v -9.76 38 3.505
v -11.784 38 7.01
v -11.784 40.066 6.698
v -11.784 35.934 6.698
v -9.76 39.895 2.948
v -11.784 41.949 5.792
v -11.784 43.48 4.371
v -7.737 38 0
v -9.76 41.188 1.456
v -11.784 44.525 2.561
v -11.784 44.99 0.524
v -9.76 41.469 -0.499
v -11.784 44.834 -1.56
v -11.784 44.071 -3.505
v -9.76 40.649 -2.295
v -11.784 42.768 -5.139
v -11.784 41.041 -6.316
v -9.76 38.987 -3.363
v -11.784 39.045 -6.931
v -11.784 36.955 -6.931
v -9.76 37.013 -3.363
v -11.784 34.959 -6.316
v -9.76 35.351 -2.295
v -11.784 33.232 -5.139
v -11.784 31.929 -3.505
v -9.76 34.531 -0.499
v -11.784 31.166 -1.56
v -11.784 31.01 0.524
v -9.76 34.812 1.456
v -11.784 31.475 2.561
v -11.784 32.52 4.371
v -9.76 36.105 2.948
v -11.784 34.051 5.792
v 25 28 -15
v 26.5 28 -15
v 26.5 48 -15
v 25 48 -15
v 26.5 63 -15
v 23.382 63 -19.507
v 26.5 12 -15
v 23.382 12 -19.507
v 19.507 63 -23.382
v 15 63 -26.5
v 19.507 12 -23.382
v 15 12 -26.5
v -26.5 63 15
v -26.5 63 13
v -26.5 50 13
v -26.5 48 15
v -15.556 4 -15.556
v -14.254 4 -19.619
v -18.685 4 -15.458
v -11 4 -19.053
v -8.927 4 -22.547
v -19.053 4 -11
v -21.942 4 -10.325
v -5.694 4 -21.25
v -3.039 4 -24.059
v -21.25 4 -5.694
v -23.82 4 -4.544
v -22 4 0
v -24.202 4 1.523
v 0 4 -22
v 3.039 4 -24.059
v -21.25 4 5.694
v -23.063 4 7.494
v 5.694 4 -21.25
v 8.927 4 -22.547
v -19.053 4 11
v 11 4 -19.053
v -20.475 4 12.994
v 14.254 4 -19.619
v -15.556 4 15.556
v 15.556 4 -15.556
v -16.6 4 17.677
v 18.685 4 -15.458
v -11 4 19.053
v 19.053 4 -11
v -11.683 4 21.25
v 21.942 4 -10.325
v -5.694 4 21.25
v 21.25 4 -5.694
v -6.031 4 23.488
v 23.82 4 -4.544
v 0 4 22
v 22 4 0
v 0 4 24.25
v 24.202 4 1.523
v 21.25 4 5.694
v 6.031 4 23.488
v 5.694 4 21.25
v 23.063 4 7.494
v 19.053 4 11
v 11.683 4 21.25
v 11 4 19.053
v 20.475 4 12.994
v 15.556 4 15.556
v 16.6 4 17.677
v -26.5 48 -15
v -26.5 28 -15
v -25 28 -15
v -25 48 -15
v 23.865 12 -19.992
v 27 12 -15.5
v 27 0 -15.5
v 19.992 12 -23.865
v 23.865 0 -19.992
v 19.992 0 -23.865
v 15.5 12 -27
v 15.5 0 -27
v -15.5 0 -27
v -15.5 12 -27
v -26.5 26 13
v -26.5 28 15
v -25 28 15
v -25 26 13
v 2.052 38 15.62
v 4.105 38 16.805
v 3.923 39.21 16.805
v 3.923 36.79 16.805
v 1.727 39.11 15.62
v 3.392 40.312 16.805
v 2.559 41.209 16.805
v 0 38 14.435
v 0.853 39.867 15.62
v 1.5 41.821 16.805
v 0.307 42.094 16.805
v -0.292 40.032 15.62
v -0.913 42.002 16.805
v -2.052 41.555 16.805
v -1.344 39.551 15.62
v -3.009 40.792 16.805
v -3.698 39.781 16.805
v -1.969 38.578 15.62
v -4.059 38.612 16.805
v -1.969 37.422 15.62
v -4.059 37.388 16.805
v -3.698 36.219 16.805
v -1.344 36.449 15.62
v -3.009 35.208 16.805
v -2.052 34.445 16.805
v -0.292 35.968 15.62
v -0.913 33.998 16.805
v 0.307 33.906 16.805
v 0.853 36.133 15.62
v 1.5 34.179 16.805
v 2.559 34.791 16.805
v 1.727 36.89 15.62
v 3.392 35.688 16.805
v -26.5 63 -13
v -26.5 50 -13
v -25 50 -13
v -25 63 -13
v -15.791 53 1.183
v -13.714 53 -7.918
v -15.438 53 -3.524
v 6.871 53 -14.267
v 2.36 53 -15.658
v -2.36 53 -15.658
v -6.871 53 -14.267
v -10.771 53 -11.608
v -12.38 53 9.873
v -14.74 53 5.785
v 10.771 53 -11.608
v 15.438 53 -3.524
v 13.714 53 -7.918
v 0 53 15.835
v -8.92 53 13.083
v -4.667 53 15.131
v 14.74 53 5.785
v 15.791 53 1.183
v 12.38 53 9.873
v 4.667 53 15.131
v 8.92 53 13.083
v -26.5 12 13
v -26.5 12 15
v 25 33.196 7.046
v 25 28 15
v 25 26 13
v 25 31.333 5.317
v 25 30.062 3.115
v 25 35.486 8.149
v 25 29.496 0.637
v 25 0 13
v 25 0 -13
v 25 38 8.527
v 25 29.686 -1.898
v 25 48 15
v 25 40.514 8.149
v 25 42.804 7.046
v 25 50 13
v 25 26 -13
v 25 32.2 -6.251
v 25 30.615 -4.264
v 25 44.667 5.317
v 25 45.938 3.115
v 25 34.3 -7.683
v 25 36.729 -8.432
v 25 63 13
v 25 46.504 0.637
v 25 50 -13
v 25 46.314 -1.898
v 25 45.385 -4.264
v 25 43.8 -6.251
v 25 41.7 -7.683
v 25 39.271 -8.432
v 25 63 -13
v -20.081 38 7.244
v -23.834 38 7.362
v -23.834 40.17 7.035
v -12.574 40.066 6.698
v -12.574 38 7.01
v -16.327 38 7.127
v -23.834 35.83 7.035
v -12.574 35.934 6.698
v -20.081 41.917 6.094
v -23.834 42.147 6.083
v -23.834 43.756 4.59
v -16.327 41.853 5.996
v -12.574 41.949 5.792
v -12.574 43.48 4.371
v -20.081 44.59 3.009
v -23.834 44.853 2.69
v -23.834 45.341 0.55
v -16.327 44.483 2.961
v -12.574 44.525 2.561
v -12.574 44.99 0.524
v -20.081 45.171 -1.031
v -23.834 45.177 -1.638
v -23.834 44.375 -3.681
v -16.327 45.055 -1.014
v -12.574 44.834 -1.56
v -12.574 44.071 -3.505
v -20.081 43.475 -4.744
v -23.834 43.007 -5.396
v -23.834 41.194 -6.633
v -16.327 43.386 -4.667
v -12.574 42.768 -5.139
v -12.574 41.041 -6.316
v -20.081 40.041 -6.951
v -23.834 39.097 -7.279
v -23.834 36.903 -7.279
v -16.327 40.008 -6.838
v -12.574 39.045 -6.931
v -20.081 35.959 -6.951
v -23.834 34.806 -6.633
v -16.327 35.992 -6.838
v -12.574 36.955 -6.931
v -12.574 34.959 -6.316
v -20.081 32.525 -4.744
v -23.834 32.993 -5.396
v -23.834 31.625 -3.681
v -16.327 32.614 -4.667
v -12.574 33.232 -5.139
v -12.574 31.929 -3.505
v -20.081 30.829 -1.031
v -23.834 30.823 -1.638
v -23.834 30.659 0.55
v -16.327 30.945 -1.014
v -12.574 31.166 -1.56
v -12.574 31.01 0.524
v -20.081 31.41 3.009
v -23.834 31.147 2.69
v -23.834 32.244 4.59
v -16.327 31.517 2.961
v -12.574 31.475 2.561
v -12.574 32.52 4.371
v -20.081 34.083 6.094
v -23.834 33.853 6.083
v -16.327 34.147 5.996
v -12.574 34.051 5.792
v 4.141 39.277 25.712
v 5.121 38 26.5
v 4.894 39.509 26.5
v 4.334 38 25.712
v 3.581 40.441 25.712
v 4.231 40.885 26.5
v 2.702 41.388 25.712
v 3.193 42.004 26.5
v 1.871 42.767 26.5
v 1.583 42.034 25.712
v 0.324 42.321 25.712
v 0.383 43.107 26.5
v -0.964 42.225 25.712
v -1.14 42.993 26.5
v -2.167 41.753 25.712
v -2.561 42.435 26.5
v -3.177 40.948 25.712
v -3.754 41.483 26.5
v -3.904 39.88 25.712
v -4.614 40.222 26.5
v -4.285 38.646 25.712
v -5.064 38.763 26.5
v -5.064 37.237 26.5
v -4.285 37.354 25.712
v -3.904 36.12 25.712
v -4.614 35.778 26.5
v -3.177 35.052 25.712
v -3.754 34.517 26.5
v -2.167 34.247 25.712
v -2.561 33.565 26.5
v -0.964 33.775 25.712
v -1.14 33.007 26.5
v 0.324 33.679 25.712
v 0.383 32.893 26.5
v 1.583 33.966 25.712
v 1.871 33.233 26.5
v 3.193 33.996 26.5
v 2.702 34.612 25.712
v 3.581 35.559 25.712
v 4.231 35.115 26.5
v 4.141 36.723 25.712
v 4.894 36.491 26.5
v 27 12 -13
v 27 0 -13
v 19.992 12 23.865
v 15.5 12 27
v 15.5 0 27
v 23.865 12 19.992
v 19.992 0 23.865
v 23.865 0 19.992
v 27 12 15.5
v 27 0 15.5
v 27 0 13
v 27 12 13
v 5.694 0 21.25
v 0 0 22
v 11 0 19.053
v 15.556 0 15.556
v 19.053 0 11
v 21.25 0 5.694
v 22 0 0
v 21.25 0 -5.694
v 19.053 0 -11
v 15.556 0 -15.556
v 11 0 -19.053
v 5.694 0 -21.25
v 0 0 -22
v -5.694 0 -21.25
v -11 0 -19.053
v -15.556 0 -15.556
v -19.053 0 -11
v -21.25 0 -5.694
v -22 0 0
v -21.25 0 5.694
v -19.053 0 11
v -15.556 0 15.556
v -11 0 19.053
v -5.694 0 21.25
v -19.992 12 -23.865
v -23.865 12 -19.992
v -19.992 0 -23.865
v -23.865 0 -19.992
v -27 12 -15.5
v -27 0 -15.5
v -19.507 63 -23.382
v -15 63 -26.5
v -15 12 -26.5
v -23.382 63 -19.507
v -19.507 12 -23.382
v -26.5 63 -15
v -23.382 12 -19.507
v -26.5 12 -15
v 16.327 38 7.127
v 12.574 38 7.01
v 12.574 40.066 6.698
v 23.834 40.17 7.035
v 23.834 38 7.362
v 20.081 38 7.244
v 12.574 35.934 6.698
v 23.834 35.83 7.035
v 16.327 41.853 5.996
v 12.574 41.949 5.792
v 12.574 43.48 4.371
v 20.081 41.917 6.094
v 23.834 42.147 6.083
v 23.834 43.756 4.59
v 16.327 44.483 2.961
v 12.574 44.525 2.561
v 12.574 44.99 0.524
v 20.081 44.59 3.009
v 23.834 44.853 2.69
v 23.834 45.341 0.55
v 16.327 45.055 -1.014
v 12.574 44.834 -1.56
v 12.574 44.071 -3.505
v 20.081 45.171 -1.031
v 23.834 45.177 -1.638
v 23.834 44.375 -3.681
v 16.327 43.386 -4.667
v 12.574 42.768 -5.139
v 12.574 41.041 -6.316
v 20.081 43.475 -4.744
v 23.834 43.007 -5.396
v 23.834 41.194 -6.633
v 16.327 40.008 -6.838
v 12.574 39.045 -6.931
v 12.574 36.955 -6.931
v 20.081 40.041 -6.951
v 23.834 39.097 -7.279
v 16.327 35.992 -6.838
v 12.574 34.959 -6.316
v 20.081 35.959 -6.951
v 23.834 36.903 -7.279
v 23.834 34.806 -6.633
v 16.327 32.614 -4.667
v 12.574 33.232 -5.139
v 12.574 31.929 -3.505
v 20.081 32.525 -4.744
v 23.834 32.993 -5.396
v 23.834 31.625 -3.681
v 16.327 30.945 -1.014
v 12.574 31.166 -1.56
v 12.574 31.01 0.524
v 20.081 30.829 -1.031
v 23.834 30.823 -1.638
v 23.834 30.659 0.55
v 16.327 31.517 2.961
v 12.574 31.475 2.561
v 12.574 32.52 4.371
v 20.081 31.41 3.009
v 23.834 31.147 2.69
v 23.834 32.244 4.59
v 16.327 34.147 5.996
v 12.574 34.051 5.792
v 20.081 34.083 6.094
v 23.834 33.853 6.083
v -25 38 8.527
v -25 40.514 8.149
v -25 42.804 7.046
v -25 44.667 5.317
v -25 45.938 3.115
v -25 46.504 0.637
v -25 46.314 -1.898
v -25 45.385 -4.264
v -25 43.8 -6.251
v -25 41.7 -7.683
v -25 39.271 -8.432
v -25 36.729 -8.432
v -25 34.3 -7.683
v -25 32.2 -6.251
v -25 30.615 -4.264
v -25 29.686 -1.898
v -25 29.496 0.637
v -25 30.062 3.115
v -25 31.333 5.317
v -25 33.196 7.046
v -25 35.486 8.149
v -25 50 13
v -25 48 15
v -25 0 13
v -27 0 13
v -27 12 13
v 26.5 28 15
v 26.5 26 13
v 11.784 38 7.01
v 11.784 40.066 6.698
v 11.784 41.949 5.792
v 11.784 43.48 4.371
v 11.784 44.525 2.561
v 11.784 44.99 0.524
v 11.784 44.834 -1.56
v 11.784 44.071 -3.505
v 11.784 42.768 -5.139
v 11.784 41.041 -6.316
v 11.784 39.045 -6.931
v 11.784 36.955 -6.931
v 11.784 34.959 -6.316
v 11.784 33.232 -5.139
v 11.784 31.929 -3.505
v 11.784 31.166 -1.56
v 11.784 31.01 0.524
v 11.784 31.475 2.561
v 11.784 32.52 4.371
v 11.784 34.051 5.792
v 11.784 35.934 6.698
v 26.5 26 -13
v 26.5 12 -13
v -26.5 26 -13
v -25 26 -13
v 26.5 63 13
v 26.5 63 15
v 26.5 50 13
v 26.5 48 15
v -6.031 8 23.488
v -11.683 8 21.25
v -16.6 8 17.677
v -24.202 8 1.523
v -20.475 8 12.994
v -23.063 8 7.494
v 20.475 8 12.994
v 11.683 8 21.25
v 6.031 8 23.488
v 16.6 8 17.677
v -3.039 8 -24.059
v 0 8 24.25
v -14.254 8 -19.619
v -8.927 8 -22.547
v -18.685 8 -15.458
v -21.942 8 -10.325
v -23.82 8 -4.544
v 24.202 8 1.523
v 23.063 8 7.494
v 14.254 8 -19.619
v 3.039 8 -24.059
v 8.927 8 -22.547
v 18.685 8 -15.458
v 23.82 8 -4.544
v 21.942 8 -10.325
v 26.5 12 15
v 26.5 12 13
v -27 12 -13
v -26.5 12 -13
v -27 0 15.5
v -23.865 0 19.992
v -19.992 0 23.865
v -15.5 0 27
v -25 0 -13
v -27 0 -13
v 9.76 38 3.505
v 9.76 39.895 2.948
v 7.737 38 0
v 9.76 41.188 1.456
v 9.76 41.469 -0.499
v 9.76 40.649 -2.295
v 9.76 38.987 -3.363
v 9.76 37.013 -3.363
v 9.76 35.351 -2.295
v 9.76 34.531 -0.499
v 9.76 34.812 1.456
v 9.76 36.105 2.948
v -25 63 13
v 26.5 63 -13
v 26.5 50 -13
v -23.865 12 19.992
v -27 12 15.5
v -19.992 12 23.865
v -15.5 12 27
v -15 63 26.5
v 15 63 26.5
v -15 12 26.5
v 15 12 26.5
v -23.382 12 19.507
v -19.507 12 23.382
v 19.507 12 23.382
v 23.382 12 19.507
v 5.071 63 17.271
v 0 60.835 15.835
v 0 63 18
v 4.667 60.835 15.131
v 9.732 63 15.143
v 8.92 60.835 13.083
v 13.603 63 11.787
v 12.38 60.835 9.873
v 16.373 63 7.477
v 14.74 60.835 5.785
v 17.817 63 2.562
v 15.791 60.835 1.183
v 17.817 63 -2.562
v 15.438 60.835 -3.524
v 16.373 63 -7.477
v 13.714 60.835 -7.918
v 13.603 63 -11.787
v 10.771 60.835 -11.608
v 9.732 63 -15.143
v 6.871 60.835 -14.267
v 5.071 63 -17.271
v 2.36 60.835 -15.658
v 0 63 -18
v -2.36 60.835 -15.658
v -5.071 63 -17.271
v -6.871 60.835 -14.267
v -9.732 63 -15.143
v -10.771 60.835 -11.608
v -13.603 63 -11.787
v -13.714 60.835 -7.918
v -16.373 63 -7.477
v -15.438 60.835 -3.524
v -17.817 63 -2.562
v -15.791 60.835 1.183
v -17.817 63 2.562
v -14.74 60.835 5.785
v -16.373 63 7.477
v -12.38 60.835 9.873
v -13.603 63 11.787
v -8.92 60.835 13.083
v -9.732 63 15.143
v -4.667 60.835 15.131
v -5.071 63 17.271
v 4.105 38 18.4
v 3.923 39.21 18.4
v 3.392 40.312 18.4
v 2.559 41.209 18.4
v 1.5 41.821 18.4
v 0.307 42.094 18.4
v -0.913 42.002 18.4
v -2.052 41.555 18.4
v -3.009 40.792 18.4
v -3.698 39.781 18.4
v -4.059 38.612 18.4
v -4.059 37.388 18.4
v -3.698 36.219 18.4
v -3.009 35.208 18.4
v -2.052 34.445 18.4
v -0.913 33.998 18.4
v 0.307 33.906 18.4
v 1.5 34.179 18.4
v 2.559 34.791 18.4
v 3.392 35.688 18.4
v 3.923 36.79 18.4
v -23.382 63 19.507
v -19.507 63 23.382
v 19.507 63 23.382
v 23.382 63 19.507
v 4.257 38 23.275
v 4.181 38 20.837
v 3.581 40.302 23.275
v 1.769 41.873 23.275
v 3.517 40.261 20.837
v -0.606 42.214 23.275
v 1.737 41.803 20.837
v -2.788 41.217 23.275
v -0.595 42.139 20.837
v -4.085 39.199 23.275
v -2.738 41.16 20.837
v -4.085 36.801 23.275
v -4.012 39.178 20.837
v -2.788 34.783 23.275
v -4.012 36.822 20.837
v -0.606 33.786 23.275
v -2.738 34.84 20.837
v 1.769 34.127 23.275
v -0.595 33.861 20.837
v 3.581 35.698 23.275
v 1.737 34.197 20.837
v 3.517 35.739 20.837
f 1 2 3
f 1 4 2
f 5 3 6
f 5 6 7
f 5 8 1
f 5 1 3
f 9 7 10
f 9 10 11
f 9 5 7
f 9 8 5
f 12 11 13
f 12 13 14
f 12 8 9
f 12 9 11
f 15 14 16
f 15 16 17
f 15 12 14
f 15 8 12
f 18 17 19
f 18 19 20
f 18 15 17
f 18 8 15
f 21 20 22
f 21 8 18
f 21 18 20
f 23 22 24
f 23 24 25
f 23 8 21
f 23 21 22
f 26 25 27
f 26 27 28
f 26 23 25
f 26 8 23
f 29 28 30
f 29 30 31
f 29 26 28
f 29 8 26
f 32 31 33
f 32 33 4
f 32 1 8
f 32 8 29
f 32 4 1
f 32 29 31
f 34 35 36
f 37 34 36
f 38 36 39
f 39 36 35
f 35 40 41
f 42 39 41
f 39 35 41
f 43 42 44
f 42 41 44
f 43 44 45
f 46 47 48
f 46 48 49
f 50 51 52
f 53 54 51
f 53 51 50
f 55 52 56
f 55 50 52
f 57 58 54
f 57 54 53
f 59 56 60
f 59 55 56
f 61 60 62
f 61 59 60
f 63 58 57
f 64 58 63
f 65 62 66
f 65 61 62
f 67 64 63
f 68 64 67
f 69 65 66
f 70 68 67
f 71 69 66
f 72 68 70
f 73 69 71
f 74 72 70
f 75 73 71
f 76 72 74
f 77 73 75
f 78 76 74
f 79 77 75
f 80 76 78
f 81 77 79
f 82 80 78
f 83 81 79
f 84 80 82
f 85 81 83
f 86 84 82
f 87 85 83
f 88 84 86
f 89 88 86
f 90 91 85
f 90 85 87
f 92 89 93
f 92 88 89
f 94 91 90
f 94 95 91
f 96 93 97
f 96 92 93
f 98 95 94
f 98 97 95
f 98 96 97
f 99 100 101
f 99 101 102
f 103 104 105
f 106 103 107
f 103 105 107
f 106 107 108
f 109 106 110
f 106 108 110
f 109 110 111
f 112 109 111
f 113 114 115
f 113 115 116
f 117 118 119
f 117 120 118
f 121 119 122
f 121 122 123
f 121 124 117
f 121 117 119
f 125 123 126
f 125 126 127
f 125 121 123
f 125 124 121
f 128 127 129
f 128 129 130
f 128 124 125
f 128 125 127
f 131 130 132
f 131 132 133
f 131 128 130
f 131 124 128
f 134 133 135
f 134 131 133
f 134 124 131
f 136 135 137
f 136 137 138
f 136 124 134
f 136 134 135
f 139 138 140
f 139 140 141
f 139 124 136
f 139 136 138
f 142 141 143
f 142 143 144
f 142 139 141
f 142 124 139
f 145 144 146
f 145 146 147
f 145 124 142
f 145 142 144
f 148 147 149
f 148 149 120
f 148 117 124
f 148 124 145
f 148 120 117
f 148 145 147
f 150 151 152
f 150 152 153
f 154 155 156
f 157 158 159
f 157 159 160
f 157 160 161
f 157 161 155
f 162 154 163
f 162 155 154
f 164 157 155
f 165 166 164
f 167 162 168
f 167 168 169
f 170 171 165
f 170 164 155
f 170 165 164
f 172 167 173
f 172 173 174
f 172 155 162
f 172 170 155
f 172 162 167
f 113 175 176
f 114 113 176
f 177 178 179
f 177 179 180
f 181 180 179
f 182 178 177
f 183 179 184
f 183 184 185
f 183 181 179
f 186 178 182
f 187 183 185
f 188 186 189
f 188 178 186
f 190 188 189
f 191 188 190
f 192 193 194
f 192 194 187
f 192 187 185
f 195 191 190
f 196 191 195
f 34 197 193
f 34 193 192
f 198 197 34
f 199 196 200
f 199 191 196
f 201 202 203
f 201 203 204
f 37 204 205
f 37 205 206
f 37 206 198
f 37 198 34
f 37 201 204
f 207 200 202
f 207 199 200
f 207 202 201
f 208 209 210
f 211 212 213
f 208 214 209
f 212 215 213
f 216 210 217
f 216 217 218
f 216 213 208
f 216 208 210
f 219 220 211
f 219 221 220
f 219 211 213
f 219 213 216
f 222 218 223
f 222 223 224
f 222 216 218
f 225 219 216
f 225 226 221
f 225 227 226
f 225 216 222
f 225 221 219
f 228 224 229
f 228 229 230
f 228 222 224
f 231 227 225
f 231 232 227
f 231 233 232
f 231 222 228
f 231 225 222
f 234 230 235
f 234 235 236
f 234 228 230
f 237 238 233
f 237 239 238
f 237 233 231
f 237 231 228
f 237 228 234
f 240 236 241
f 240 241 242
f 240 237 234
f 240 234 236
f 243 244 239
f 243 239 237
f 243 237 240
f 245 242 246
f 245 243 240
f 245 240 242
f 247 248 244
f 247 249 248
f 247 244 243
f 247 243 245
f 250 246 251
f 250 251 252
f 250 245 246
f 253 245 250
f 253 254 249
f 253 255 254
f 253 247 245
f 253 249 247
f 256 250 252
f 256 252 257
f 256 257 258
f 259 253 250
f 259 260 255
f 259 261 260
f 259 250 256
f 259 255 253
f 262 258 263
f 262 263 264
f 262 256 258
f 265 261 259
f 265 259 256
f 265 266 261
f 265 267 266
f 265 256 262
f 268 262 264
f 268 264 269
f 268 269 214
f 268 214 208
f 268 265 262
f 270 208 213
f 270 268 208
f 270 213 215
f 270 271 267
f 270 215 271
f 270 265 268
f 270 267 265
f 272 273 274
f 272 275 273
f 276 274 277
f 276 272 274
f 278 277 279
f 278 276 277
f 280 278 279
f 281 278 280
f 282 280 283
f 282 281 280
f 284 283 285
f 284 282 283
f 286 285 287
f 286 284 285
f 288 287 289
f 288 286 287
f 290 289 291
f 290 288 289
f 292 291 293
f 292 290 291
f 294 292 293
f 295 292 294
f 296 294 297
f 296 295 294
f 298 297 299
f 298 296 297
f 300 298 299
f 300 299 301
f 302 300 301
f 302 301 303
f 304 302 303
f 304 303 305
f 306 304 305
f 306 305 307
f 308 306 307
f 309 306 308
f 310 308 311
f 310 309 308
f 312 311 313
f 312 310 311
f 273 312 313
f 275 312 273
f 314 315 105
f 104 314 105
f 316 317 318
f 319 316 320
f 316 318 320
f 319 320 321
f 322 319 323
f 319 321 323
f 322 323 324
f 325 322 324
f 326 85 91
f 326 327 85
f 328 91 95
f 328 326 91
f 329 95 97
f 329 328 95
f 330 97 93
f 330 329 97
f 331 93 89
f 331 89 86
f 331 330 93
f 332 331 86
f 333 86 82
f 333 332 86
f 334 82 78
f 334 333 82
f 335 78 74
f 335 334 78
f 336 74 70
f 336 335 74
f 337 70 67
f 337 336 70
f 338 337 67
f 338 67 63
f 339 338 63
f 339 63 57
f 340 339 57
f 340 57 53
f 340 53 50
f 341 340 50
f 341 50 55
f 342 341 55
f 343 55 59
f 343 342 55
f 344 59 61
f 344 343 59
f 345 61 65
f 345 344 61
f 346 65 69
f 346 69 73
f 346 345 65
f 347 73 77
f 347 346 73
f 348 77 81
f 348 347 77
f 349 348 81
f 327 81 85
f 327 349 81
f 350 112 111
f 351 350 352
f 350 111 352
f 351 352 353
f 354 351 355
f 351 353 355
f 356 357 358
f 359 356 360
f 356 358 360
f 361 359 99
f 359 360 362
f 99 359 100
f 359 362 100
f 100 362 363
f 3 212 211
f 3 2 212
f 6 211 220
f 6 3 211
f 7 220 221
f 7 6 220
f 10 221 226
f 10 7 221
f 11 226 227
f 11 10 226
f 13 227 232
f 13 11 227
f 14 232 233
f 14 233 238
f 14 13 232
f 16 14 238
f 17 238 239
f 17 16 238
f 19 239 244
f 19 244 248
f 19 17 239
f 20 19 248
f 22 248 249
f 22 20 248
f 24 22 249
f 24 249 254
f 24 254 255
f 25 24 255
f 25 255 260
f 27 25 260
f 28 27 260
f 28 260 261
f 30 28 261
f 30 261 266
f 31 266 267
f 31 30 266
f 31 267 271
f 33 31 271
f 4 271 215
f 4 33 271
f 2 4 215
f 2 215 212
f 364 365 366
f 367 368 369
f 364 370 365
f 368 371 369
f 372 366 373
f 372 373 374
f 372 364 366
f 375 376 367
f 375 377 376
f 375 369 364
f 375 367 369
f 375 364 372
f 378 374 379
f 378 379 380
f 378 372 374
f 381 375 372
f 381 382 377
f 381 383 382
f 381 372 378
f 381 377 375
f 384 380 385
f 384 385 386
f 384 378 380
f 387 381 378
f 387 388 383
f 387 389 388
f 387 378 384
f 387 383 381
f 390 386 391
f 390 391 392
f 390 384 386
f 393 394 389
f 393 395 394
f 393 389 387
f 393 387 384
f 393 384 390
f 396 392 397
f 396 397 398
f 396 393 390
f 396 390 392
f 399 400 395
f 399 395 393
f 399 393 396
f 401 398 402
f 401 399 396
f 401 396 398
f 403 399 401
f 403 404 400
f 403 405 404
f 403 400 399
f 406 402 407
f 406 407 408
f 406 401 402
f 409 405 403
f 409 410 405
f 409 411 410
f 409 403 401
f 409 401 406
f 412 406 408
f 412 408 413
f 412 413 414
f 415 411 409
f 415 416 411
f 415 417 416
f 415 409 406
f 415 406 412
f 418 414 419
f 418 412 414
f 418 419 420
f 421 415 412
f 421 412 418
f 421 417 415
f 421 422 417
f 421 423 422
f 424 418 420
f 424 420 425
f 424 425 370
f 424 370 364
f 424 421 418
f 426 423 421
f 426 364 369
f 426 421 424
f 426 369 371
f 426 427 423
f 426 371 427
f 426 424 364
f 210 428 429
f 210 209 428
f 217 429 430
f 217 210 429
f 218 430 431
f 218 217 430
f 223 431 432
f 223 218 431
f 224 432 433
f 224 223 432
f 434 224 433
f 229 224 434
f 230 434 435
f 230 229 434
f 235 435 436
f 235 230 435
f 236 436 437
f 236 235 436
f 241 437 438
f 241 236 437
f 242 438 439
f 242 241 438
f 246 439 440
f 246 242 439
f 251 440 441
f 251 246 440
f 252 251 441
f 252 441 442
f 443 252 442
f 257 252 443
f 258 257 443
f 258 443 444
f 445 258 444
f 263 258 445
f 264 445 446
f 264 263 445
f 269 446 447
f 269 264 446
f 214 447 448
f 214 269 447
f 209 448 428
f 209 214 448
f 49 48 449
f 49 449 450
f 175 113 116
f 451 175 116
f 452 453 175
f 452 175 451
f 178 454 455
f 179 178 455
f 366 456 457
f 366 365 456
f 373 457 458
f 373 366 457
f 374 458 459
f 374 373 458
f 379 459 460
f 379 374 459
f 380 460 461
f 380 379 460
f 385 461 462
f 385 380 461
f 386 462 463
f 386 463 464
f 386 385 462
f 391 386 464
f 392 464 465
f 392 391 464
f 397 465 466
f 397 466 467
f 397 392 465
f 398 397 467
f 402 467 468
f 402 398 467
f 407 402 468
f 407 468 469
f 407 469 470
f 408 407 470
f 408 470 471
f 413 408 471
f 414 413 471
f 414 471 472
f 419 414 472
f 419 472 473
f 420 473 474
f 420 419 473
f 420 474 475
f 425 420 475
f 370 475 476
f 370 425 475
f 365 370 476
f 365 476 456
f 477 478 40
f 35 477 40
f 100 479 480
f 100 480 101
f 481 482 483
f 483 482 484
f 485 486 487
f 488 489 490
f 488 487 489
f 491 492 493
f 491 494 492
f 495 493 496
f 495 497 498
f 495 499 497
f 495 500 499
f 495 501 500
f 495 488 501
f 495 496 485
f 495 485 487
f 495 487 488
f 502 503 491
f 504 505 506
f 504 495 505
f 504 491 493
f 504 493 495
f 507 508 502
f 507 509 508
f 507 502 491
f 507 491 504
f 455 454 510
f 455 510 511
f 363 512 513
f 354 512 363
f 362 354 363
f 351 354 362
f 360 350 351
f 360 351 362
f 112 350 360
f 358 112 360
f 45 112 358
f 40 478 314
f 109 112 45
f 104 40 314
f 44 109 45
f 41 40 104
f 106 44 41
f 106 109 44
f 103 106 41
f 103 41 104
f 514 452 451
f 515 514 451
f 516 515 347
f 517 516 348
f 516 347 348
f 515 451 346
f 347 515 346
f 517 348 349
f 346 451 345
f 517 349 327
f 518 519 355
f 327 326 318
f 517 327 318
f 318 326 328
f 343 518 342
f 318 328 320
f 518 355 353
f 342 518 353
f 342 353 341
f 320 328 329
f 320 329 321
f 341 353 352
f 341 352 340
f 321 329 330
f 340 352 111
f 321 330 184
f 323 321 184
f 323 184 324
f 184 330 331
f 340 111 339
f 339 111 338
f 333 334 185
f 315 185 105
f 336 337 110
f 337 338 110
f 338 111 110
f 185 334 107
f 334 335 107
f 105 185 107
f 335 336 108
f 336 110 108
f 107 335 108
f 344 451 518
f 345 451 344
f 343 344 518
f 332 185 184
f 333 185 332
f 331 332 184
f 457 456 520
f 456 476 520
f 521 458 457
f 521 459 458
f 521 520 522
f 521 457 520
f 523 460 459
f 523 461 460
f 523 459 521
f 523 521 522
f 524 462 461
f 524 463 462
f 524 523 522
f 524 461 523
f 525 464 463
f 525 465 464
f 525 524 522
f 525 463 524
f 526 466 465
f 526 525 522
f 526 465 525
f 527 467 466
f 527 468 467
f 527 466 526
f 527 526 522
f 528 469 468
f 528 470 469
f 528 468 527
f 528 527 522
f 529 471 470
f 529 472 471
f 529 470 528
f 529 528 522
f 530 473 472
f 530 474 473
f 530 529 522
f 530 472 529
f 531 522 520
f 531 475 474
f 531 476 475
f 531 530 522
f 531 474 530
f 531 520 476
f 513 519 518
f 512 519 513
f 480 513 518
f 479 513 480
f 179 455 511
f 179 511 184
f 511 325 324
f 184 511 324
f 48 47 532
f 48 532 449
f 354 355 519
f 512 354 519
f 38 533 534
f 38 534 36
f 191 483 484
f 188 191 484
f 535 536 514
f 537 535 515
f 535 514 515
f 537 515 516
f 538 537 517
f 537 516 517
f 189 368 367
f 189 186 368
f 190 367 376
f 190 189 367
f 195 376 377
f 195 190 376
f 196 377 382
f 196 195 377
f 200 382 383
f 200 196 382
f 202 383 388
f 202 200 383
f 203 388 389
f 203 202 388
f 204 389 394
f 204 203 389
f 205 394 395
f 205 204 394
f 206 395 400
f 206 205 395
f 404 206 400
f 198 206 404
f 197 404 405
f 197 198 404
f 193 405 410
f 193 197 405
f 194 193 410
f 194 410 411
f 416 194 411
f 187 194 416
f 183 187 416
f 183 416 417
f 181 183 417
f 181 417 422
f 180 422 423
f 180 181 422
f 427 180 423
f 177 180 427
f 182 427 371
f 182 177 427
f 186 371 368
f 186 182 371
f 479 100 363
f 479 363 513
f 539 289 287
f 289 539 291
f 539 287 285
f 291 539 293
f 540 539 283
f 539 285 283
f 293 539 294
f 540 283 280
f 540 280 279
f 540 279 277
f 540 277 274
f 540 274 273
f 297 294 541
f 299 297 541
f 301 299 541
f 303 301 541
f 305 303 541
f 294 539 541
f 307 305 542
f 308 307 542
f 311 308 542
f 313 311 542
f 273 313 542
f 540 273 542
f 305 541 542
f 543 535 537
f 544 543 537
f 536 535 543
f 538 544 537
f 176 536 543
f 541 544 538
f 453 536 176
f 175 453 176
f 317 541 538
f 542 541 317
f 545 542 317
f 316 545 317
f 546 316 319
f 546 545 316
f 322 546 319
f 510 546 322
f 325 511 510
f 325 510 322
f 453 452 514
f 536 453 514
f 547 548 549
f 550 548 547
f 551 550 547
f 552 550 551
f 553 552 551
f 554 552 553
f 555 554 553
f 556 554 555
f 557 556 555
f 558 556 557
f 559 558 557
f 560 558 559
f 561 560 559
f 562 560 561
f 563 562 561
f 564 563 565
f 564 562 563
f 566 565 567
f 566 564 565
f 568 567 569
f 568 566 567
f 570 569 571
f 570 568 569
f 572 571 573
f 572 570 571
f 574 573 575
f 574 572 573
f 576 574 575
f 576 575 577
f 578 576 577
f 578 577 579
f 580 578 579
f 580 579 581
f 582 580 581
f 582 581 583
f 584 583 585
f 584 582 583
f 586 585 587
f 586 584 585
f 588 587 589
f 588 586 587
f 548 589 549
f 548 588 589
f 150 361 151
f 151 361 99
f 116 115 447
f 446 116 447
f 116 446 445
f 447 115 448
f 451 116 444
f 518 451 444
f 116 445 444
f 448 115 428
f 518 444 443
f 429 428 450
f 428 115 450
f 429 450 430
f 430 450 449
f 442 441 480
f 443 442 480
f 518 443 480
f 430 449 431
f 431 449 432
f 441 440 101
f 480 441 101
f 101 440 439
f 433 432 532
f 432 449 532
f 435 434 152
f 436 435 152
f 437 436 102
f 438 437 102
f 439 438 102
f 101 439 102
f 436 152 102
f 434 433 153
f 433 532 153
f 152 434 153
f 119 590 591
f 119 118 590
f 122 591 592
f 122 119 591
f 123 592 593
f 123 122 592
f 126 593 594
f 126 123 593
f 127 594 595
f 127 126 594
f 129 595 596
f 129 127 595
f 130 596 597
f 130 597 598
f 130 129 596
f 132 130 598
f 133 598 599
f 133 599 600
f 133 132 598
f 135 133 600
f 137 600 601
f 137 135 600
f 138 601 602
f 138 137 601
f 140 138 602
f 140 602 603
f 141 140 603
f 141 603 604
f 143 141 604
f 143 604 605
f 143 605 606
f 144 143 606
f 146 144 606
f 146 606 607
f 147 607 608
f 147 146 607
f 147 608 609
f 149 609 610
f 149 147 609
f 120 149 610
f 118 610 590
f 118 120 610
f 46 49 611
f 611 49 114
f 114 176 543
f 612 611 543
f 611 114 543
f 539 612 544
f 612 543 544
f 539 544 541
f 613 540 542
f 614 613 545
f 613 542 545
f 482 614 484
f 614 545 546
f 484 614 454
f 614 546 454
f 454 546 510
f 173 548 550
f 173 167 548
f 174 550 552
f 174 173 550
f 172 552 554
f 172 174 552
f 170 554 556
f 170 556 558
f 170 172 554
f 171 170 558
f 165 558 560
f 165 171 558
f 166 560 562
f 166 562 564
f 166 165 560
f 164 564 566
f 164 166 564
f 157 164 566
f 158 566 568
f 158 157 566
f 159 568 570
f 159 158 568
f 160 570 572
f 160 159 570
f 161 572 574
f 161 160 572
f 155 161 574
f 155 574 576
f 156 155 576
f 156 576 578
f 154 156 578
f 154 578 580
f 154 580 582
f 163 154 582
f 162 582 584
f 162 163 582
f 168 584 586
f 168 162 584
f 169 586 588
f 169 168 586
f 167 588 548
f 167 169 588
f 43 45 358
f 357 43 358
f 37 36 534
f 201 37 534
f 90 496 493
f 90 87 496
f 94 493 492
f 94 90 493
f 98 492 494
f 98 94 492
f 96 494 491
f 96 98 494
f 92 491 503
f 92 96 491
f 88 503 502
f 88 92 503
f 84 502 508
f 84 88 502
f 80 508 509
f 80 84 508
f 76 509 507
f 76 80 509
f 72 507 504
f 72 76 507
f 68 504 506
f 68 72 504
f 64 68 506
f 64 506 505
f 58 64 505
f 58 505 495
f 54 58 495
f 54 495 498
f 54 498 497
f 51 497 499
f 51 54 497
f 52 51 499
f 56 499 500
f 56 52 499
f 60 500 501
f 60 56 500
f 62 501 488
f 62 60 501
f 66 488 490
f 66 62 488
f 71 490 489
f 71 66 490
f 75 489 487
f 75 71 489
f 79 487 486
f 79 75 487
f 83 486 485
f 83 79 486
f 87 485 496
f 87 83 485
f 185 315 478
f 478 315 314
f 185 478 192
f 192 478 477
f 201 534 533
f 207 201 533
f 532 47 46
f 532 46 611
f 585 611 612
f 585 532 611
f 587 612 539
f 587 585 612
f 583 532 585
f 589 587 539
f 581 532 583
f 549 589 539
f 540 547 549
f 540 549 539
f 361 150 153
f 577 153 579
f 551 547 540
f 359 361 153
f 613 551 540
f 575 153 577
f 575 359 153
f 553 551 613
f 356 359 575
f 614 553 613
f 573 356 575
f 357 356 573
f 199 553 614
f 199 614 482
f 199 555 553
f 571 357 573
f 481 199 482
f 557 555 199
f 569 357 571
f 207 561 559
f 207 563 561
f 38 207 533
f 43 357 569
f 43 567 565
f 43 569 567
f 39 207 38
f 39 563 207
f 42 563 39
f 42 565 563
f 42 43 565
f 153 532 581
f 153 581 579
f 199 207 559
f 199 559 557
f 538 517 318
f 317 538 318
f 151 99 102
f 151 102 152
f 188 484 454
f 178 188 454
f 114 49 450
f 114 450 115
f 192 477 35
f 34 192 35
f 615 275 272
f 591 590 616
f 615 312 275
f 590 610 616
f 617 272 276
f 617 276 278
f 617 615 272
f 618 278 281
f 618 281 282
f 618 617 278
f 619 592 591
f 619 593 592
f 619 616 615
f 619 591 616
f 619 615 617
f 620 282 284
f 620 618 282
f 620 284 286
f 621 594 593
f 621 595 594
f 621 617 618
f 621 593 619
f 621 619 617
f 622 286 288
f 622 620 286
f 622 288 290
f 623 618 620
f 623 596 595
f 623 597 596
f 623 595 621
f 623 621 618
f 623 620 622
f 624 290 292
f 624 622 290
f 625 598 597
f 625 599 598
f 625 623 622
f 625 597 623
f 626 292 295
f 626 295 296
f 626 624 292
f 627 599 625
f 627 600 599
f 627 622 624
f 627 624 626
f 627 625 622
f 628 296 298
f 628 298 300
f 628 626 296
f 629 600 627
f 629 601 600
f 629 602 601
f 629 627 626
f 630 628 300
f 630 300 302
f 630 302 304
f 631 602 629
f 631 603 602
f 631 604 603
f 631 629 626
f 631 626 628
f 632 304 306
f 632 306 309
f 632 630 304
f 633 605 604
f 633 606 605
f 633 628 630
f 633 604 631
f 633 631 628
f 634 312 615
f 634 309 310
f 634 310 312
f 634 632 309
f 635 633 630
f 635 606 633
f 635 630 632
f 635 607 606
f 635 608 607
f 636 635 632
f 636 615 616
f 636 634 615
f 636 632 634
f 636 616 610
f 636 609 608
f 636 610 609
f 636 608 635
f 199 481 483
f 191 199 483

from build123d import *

# Parameters (mm, degrees)
EXTRUDE_1_DEPTH     = 63
EXTRUDE_2_DEPTH     = 12
CUT_EXTRUDE_1_DEPTH = 2
CUT_EXTRUDE_2_DEPTH = 2


with BuildPart() as part:
    # 草图1 → 凸台-拉伸1 (new body)
    with BuildSketch(Plane(origin=(0, 0, 0), x_dir=(1, 0, 0), z_dir=(0, 1, 0))):
        with BuildLine():
            Line((-26.5, 15), (-26.5, -15))
            ThreePointArc((-26.5, -15), (-21.531953, -21.531953), (-15, -26.5))
            Line((-15, -26.5), (15, -26.5))
            ThreePointArc((15, -26.5), (21.531953, -21.531953), (26.5, -15))
            Line((26.5, -15), (26.5, 15))
            ThreePointArc((26.5, 15), (21.531953, 21.531953), (15, 26.5))
            Line((15, 26.5), (-15, 26.5))
            ThreePointArc((-15, 26.5), (-21.531953, 21.531953), (-26.5, 15))
        make_face()
    extrude(amount=EXTRUDE_1_DEPTH)

    # 草图2 → 凸台-拉伸2 (add)
    with BuildSketch(Plane(origin=(0, 0, 0), x_dir=(1, 0, 0), z_dir=(0, 1, 0))):
        with BuildLine():
            Line((-27, 15.5), (-27, -15.5))
            ThreePointArc((-27, -15.5), (-22.014199963, -22.014199963), (-15.5, -27))
            Line((-15.5, -27), (15.5, -27))
            ThreePointArc((15.5, -27), (22.014199963, -22.014199963), (27, -15.5))
            Line((27, -15.5), (27, 15.5))
            ThreePointArc((27, 15.5), (22.014199963, 22.014199963), (15.5, 27))
            Line((15.5, 27), (-15.5, 27))
            ThreePointArc((-15.5, 27), (-22.014199963, 22.014199963), (-27, 15.5))
        make_face()
    extrude(amount=EXTRUDE_2_DEPTH)

    # 草图3 → 切除-拉伸1 (cut)
    with BuildSketch(Plane(origin=(-27, 0, 0), x_dir=(0, 0, -1), z_dir=(1, 0, 0))):
        Polygon((-15, 48), (-15, 28), (-13, 26), (-13, 0), (13, 0), (13, 26), (15, 28), (15, 48), (13, 50), (13, 63), (-13, 63), (-13, 50), align=None)
    extrude(amount=CUT_EXTRUDE_1_DEPTH, mode=Mode.SUBTRACT)

    # 草图4 → 切除-拉伸2 (cut)
    with BuildSketch(Plane(origin=(27, 0, 0), x_dir=(0, 0, -1), z_dir=(1, 0, 0))):
        Polygon((-15, 48), (-15, 28), (-13, 26), (-13, 0), (13, 0), (13, 26), (15, 28), (15, 48), (13, 50), (13, 63), (-13, 63), (-13, 50), align=None)
    extrude(amount=-CUT_EXTRUDE_2_DEPTH, mode=Mode.SUBTRACT)

    # 草图5 → 切除-旋转1 (revolve, cut)
    with BuildSketch(Plane.XY):
        Polygon((0, 63), (18, 63), (15.835, 60.835), (15.835, 53), (0, 53), align=None)
    revolve(axis=Axis((0, 53, 0), (0, 1, 0)), mode=Mode.SUBTRACT)

    # 草图6 → 切除-旋转2 (revolve, cut)
    with BuildSketch(Plane.XY):
        Polygon((0, 8), (24.25, 8), (24.25, 4), (22, 4), (22, 0), (0, 0), align=None)
    revolve(axis=Axis((0, 0, 0), (0, 1, 0)), mode=Mode.SUBTRACT)

    # 草图7 → 切除-旋转3 (revolve, cut)
    with BuildSketch(Plane.XY):
        Polygon((-25, 38), (-25, 46.52745952), (-23.834216348, 45.361675868), (-12.573965271, 45.009775437), (-11.783762402, 45.009775437), (-7.736666667, 38), align=None)
    revolve(axis=Axis((-7.736666667, 38, 0), (-1, 0, 0)), mode=Mode.SUBTRACT)

    # 草图8 → 切除-旋转4 (revolve, cut)
    with BuildSketch(Plane.XY):
        Polygon((7.736666667, 38), (11.783762402, 45.009775437), (12.573965271, 45.009775437), (23.834216348, 45.361675868), (25, 46.52745952), (25, 38), align=None)
    revolve(axis=Axis((25, 38, 0), (-1, 0, 0)), mode=Mode.SUBTRACT)

    # 草图9 → 切除-旋转5 (revolve, cut)
    with BuildSketch(Plane(origin=(0, 0, 0), x_dir=(0, 0, -1), z_dir=(1, 0, 0))):
        Polygon((-26.5, 38), (-26.5, 43.121093906), (-25.712414411, 42.333508317), (-18.399867395, 42.104979803), (-16.804611194, 42.104979803), (-14.4346, 38), align=None)
    revolve(axis=Axis((0, 38, 14.4346), (0, 0, 1)), mode=Mode.SUBTRACT)


solid = part.part
